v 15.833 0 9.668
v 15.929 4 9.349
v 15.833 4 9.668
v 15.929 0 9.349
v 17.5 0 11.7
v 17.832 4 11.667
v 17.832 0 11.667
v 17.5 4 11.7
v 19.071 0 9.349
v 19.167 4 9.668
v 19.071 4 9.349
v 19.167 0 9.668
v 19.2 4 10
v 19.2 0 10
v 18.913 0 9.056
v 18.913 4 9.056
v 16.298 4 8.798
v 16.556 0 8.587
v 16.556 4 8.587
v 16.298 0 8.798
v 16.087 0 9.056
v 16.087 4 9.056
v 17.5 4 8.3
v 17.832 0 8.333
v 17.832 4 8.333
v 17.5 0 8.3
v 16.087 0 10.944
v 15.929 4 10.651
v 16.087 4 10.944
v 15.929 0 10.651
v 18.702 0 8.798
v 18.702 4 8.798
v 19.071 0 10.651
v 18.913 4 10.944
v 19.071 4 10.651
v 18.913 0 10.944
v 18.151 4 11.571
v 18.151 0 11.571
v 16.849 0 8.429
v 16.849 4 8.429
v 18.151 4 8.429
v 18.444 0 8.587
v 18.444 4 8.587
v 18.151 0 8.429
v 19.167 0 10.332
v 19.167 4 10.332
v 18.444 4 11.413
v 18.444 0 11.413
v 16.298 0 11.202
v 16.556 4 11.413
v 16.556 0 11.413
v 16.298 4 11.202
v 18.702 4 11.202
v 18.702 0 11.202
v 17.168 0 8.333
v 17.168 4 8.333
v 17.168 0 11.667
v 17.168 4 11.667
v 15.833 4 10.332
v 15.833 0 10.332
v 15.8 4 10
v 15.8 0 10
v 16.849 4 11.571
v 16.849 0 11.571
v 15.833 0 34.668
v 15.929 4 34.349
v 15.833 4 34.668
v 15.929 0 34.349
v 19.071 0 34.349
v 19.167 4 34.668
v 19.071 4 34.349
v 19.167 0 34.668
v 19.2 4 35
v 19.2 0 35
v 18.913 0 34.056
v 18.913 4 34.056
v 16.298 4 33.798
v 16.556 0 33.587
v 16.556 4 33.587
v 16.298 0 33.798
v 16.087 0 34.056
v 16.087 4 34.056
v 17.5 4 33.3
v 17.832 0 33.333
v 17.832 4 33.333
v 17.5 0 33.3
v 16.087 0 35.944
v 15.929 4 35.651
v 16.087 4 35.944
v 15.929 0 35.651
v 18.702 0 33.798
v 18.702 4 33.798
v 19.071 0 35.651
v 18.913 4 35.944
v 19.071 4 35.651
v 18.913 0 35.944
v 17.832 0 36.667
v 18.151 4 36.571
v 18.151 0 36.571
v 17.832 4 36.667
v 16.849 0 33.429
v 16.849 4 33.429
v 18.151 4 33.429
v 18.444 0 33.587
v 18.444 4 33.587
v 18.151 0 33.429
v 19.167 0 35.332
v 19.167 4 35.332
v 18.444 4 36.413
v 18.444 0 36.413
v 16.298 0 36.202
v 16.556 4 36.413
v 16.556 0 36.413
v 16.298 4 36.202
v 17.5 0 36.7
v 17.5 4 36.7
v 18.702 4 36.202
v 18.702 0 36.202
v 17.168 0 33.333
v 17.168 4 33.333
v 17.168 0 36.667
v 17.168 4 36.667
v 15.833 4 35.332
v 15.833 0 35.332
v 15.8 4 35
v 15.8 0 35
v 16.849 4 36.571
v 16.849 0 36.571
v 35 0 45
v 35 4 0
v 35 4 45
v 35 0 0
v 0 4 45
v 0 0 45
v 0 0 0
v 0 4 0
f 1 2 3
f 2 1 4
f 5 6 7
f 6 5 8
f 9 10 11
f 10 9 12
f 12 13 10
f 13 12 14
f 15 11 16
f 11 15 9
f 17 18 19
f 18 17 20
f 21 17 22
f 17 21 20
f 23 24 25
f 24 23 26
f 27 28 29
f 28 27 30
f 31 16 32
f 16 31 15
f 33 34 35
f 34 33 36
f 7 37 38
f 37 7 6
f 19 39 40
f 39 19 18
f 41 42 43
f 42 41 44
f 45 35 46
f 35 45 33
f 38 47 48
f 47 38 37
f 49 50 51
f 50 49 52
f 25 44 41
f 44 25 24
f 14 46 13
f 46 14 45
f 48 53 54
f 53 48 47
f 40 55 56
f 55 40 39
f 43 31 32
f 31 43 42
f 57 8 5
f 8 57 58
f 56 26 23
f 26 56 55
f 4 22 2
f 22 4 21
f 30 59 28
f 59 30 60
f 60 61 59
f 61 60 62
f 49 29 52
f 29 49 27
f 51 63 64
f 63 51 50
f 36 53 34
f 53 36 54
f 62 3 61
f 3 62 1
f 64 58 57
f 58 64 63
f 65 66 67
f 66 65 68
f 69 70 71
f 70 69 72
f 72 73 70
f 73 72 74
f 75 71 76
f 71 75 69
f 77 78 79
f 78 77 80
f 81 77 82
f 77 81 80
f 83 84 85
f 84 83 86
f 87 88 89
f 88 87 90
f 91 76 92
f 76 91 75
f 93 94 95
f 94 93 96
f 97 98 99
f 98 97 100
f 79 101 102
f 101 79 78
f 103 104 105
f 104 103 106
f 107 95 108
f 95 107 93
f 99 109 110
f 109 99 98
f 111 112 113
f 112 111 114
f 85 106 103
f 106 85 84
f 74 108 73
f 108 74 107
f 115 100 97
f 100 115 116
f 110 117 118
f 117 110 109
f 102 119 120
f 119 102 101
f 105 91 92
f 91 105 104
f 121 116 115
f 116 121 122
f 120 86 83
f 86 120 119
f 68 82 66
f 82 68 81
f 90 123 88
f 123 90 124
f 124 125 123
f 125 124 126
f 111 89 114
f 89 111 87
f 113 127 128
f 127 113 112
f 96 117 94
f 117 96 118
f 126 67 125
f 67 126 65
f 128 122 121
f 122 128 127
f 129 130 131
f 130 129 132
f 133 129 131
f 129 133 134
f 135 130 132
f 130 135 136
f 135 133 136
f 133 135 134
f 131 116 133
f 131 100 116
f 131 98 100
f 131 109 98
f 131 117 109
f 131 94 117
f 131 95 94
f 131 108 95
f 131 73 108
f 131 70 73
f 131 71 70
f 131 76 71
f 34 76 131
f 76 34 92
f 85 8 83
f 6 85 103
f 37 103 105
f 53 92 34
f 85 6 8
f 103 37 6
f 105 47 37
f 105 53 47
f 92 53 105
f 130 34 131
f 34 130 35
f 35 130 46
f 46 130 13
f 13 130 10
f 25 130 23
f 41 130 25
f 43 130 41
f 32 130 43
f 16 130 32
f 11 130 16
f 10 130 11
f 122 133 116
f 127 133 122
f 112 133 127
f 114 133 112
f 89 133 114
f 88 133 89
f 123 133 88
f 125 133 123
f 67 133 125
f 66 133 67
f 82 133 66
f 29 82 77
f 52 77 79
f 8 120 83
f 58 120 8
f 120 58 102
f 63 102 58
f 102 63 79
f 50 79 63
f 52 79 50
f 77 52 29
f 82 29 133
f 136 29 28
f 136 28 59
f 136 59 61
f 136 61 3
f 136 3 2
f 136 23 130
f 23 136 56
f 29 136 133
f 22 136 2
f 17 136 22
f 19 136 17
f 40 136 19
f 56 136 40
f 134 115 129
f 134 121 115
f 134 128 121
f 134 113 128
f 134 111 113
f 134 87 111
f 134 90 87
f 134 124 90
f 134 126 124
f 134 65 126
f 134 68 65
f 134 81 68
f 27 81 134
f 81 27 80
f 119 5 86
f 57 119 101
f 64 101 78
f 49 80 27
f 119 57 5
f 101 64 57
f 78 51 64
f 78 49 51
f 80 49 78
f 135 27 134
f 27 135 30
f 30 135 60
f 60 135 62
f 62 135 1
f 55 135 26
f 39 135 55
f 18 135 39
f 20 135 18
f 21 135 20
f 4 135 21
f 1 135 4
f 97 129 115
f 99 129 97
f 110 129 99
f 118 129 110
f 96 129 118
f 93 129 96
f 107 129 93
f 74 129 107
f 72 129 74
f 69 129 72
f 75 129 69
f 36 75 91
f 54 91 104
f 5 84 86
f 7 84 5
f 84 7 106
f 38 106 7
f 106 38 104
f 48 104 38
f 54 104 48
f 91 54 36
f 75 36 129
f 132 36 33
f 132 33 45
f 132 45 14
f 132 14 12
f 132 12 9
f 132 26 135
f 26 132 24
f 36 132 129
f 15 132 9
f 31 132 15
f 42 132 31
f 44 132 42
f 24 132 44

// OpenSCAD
// ModuDeck donor chassis study: NOT a verified ThinkPad fit.
// Millimetres. 370x240 is an unconfirmed owner measurement.
$fn=32; W=370; D=240; t=3;
module plate(w,d,h){cube([w,d,h]);}
module shell(w,d,h){difference(){cube([w,d,h]);translate([t,t,t])cube([w-2*t,d-2*t,h]);}}
module hole(x,y,h){translate([x,y,-1])cylinder(d=3.4,h=h+2);}
module rail(n){difference(){cube([n,12,6]);for(x=[10:20:n-10])hole(x,6,6);}}
module rear(){difference(){cube([W-6,3,25]);translate([W/2-23,-1,6])cube([40,5,14]);for(x=[10,W-16])translate([x,-1,12])rotate([-90,0,0])cylinder(d=3.4,h=5);}}
module tray(){difference(){shell(W,D,30);translate([3,D-4,3])cube([W-6,6,27]);for(x=[15,W-15],y=[15,D-15])hole(x,y,30);}}
difference(){cube([35,4,45]);for(z=[10,35])translate([17.5,-1,z])rotate([-90,0,0])cylinder(d=3.4,h=6);}
